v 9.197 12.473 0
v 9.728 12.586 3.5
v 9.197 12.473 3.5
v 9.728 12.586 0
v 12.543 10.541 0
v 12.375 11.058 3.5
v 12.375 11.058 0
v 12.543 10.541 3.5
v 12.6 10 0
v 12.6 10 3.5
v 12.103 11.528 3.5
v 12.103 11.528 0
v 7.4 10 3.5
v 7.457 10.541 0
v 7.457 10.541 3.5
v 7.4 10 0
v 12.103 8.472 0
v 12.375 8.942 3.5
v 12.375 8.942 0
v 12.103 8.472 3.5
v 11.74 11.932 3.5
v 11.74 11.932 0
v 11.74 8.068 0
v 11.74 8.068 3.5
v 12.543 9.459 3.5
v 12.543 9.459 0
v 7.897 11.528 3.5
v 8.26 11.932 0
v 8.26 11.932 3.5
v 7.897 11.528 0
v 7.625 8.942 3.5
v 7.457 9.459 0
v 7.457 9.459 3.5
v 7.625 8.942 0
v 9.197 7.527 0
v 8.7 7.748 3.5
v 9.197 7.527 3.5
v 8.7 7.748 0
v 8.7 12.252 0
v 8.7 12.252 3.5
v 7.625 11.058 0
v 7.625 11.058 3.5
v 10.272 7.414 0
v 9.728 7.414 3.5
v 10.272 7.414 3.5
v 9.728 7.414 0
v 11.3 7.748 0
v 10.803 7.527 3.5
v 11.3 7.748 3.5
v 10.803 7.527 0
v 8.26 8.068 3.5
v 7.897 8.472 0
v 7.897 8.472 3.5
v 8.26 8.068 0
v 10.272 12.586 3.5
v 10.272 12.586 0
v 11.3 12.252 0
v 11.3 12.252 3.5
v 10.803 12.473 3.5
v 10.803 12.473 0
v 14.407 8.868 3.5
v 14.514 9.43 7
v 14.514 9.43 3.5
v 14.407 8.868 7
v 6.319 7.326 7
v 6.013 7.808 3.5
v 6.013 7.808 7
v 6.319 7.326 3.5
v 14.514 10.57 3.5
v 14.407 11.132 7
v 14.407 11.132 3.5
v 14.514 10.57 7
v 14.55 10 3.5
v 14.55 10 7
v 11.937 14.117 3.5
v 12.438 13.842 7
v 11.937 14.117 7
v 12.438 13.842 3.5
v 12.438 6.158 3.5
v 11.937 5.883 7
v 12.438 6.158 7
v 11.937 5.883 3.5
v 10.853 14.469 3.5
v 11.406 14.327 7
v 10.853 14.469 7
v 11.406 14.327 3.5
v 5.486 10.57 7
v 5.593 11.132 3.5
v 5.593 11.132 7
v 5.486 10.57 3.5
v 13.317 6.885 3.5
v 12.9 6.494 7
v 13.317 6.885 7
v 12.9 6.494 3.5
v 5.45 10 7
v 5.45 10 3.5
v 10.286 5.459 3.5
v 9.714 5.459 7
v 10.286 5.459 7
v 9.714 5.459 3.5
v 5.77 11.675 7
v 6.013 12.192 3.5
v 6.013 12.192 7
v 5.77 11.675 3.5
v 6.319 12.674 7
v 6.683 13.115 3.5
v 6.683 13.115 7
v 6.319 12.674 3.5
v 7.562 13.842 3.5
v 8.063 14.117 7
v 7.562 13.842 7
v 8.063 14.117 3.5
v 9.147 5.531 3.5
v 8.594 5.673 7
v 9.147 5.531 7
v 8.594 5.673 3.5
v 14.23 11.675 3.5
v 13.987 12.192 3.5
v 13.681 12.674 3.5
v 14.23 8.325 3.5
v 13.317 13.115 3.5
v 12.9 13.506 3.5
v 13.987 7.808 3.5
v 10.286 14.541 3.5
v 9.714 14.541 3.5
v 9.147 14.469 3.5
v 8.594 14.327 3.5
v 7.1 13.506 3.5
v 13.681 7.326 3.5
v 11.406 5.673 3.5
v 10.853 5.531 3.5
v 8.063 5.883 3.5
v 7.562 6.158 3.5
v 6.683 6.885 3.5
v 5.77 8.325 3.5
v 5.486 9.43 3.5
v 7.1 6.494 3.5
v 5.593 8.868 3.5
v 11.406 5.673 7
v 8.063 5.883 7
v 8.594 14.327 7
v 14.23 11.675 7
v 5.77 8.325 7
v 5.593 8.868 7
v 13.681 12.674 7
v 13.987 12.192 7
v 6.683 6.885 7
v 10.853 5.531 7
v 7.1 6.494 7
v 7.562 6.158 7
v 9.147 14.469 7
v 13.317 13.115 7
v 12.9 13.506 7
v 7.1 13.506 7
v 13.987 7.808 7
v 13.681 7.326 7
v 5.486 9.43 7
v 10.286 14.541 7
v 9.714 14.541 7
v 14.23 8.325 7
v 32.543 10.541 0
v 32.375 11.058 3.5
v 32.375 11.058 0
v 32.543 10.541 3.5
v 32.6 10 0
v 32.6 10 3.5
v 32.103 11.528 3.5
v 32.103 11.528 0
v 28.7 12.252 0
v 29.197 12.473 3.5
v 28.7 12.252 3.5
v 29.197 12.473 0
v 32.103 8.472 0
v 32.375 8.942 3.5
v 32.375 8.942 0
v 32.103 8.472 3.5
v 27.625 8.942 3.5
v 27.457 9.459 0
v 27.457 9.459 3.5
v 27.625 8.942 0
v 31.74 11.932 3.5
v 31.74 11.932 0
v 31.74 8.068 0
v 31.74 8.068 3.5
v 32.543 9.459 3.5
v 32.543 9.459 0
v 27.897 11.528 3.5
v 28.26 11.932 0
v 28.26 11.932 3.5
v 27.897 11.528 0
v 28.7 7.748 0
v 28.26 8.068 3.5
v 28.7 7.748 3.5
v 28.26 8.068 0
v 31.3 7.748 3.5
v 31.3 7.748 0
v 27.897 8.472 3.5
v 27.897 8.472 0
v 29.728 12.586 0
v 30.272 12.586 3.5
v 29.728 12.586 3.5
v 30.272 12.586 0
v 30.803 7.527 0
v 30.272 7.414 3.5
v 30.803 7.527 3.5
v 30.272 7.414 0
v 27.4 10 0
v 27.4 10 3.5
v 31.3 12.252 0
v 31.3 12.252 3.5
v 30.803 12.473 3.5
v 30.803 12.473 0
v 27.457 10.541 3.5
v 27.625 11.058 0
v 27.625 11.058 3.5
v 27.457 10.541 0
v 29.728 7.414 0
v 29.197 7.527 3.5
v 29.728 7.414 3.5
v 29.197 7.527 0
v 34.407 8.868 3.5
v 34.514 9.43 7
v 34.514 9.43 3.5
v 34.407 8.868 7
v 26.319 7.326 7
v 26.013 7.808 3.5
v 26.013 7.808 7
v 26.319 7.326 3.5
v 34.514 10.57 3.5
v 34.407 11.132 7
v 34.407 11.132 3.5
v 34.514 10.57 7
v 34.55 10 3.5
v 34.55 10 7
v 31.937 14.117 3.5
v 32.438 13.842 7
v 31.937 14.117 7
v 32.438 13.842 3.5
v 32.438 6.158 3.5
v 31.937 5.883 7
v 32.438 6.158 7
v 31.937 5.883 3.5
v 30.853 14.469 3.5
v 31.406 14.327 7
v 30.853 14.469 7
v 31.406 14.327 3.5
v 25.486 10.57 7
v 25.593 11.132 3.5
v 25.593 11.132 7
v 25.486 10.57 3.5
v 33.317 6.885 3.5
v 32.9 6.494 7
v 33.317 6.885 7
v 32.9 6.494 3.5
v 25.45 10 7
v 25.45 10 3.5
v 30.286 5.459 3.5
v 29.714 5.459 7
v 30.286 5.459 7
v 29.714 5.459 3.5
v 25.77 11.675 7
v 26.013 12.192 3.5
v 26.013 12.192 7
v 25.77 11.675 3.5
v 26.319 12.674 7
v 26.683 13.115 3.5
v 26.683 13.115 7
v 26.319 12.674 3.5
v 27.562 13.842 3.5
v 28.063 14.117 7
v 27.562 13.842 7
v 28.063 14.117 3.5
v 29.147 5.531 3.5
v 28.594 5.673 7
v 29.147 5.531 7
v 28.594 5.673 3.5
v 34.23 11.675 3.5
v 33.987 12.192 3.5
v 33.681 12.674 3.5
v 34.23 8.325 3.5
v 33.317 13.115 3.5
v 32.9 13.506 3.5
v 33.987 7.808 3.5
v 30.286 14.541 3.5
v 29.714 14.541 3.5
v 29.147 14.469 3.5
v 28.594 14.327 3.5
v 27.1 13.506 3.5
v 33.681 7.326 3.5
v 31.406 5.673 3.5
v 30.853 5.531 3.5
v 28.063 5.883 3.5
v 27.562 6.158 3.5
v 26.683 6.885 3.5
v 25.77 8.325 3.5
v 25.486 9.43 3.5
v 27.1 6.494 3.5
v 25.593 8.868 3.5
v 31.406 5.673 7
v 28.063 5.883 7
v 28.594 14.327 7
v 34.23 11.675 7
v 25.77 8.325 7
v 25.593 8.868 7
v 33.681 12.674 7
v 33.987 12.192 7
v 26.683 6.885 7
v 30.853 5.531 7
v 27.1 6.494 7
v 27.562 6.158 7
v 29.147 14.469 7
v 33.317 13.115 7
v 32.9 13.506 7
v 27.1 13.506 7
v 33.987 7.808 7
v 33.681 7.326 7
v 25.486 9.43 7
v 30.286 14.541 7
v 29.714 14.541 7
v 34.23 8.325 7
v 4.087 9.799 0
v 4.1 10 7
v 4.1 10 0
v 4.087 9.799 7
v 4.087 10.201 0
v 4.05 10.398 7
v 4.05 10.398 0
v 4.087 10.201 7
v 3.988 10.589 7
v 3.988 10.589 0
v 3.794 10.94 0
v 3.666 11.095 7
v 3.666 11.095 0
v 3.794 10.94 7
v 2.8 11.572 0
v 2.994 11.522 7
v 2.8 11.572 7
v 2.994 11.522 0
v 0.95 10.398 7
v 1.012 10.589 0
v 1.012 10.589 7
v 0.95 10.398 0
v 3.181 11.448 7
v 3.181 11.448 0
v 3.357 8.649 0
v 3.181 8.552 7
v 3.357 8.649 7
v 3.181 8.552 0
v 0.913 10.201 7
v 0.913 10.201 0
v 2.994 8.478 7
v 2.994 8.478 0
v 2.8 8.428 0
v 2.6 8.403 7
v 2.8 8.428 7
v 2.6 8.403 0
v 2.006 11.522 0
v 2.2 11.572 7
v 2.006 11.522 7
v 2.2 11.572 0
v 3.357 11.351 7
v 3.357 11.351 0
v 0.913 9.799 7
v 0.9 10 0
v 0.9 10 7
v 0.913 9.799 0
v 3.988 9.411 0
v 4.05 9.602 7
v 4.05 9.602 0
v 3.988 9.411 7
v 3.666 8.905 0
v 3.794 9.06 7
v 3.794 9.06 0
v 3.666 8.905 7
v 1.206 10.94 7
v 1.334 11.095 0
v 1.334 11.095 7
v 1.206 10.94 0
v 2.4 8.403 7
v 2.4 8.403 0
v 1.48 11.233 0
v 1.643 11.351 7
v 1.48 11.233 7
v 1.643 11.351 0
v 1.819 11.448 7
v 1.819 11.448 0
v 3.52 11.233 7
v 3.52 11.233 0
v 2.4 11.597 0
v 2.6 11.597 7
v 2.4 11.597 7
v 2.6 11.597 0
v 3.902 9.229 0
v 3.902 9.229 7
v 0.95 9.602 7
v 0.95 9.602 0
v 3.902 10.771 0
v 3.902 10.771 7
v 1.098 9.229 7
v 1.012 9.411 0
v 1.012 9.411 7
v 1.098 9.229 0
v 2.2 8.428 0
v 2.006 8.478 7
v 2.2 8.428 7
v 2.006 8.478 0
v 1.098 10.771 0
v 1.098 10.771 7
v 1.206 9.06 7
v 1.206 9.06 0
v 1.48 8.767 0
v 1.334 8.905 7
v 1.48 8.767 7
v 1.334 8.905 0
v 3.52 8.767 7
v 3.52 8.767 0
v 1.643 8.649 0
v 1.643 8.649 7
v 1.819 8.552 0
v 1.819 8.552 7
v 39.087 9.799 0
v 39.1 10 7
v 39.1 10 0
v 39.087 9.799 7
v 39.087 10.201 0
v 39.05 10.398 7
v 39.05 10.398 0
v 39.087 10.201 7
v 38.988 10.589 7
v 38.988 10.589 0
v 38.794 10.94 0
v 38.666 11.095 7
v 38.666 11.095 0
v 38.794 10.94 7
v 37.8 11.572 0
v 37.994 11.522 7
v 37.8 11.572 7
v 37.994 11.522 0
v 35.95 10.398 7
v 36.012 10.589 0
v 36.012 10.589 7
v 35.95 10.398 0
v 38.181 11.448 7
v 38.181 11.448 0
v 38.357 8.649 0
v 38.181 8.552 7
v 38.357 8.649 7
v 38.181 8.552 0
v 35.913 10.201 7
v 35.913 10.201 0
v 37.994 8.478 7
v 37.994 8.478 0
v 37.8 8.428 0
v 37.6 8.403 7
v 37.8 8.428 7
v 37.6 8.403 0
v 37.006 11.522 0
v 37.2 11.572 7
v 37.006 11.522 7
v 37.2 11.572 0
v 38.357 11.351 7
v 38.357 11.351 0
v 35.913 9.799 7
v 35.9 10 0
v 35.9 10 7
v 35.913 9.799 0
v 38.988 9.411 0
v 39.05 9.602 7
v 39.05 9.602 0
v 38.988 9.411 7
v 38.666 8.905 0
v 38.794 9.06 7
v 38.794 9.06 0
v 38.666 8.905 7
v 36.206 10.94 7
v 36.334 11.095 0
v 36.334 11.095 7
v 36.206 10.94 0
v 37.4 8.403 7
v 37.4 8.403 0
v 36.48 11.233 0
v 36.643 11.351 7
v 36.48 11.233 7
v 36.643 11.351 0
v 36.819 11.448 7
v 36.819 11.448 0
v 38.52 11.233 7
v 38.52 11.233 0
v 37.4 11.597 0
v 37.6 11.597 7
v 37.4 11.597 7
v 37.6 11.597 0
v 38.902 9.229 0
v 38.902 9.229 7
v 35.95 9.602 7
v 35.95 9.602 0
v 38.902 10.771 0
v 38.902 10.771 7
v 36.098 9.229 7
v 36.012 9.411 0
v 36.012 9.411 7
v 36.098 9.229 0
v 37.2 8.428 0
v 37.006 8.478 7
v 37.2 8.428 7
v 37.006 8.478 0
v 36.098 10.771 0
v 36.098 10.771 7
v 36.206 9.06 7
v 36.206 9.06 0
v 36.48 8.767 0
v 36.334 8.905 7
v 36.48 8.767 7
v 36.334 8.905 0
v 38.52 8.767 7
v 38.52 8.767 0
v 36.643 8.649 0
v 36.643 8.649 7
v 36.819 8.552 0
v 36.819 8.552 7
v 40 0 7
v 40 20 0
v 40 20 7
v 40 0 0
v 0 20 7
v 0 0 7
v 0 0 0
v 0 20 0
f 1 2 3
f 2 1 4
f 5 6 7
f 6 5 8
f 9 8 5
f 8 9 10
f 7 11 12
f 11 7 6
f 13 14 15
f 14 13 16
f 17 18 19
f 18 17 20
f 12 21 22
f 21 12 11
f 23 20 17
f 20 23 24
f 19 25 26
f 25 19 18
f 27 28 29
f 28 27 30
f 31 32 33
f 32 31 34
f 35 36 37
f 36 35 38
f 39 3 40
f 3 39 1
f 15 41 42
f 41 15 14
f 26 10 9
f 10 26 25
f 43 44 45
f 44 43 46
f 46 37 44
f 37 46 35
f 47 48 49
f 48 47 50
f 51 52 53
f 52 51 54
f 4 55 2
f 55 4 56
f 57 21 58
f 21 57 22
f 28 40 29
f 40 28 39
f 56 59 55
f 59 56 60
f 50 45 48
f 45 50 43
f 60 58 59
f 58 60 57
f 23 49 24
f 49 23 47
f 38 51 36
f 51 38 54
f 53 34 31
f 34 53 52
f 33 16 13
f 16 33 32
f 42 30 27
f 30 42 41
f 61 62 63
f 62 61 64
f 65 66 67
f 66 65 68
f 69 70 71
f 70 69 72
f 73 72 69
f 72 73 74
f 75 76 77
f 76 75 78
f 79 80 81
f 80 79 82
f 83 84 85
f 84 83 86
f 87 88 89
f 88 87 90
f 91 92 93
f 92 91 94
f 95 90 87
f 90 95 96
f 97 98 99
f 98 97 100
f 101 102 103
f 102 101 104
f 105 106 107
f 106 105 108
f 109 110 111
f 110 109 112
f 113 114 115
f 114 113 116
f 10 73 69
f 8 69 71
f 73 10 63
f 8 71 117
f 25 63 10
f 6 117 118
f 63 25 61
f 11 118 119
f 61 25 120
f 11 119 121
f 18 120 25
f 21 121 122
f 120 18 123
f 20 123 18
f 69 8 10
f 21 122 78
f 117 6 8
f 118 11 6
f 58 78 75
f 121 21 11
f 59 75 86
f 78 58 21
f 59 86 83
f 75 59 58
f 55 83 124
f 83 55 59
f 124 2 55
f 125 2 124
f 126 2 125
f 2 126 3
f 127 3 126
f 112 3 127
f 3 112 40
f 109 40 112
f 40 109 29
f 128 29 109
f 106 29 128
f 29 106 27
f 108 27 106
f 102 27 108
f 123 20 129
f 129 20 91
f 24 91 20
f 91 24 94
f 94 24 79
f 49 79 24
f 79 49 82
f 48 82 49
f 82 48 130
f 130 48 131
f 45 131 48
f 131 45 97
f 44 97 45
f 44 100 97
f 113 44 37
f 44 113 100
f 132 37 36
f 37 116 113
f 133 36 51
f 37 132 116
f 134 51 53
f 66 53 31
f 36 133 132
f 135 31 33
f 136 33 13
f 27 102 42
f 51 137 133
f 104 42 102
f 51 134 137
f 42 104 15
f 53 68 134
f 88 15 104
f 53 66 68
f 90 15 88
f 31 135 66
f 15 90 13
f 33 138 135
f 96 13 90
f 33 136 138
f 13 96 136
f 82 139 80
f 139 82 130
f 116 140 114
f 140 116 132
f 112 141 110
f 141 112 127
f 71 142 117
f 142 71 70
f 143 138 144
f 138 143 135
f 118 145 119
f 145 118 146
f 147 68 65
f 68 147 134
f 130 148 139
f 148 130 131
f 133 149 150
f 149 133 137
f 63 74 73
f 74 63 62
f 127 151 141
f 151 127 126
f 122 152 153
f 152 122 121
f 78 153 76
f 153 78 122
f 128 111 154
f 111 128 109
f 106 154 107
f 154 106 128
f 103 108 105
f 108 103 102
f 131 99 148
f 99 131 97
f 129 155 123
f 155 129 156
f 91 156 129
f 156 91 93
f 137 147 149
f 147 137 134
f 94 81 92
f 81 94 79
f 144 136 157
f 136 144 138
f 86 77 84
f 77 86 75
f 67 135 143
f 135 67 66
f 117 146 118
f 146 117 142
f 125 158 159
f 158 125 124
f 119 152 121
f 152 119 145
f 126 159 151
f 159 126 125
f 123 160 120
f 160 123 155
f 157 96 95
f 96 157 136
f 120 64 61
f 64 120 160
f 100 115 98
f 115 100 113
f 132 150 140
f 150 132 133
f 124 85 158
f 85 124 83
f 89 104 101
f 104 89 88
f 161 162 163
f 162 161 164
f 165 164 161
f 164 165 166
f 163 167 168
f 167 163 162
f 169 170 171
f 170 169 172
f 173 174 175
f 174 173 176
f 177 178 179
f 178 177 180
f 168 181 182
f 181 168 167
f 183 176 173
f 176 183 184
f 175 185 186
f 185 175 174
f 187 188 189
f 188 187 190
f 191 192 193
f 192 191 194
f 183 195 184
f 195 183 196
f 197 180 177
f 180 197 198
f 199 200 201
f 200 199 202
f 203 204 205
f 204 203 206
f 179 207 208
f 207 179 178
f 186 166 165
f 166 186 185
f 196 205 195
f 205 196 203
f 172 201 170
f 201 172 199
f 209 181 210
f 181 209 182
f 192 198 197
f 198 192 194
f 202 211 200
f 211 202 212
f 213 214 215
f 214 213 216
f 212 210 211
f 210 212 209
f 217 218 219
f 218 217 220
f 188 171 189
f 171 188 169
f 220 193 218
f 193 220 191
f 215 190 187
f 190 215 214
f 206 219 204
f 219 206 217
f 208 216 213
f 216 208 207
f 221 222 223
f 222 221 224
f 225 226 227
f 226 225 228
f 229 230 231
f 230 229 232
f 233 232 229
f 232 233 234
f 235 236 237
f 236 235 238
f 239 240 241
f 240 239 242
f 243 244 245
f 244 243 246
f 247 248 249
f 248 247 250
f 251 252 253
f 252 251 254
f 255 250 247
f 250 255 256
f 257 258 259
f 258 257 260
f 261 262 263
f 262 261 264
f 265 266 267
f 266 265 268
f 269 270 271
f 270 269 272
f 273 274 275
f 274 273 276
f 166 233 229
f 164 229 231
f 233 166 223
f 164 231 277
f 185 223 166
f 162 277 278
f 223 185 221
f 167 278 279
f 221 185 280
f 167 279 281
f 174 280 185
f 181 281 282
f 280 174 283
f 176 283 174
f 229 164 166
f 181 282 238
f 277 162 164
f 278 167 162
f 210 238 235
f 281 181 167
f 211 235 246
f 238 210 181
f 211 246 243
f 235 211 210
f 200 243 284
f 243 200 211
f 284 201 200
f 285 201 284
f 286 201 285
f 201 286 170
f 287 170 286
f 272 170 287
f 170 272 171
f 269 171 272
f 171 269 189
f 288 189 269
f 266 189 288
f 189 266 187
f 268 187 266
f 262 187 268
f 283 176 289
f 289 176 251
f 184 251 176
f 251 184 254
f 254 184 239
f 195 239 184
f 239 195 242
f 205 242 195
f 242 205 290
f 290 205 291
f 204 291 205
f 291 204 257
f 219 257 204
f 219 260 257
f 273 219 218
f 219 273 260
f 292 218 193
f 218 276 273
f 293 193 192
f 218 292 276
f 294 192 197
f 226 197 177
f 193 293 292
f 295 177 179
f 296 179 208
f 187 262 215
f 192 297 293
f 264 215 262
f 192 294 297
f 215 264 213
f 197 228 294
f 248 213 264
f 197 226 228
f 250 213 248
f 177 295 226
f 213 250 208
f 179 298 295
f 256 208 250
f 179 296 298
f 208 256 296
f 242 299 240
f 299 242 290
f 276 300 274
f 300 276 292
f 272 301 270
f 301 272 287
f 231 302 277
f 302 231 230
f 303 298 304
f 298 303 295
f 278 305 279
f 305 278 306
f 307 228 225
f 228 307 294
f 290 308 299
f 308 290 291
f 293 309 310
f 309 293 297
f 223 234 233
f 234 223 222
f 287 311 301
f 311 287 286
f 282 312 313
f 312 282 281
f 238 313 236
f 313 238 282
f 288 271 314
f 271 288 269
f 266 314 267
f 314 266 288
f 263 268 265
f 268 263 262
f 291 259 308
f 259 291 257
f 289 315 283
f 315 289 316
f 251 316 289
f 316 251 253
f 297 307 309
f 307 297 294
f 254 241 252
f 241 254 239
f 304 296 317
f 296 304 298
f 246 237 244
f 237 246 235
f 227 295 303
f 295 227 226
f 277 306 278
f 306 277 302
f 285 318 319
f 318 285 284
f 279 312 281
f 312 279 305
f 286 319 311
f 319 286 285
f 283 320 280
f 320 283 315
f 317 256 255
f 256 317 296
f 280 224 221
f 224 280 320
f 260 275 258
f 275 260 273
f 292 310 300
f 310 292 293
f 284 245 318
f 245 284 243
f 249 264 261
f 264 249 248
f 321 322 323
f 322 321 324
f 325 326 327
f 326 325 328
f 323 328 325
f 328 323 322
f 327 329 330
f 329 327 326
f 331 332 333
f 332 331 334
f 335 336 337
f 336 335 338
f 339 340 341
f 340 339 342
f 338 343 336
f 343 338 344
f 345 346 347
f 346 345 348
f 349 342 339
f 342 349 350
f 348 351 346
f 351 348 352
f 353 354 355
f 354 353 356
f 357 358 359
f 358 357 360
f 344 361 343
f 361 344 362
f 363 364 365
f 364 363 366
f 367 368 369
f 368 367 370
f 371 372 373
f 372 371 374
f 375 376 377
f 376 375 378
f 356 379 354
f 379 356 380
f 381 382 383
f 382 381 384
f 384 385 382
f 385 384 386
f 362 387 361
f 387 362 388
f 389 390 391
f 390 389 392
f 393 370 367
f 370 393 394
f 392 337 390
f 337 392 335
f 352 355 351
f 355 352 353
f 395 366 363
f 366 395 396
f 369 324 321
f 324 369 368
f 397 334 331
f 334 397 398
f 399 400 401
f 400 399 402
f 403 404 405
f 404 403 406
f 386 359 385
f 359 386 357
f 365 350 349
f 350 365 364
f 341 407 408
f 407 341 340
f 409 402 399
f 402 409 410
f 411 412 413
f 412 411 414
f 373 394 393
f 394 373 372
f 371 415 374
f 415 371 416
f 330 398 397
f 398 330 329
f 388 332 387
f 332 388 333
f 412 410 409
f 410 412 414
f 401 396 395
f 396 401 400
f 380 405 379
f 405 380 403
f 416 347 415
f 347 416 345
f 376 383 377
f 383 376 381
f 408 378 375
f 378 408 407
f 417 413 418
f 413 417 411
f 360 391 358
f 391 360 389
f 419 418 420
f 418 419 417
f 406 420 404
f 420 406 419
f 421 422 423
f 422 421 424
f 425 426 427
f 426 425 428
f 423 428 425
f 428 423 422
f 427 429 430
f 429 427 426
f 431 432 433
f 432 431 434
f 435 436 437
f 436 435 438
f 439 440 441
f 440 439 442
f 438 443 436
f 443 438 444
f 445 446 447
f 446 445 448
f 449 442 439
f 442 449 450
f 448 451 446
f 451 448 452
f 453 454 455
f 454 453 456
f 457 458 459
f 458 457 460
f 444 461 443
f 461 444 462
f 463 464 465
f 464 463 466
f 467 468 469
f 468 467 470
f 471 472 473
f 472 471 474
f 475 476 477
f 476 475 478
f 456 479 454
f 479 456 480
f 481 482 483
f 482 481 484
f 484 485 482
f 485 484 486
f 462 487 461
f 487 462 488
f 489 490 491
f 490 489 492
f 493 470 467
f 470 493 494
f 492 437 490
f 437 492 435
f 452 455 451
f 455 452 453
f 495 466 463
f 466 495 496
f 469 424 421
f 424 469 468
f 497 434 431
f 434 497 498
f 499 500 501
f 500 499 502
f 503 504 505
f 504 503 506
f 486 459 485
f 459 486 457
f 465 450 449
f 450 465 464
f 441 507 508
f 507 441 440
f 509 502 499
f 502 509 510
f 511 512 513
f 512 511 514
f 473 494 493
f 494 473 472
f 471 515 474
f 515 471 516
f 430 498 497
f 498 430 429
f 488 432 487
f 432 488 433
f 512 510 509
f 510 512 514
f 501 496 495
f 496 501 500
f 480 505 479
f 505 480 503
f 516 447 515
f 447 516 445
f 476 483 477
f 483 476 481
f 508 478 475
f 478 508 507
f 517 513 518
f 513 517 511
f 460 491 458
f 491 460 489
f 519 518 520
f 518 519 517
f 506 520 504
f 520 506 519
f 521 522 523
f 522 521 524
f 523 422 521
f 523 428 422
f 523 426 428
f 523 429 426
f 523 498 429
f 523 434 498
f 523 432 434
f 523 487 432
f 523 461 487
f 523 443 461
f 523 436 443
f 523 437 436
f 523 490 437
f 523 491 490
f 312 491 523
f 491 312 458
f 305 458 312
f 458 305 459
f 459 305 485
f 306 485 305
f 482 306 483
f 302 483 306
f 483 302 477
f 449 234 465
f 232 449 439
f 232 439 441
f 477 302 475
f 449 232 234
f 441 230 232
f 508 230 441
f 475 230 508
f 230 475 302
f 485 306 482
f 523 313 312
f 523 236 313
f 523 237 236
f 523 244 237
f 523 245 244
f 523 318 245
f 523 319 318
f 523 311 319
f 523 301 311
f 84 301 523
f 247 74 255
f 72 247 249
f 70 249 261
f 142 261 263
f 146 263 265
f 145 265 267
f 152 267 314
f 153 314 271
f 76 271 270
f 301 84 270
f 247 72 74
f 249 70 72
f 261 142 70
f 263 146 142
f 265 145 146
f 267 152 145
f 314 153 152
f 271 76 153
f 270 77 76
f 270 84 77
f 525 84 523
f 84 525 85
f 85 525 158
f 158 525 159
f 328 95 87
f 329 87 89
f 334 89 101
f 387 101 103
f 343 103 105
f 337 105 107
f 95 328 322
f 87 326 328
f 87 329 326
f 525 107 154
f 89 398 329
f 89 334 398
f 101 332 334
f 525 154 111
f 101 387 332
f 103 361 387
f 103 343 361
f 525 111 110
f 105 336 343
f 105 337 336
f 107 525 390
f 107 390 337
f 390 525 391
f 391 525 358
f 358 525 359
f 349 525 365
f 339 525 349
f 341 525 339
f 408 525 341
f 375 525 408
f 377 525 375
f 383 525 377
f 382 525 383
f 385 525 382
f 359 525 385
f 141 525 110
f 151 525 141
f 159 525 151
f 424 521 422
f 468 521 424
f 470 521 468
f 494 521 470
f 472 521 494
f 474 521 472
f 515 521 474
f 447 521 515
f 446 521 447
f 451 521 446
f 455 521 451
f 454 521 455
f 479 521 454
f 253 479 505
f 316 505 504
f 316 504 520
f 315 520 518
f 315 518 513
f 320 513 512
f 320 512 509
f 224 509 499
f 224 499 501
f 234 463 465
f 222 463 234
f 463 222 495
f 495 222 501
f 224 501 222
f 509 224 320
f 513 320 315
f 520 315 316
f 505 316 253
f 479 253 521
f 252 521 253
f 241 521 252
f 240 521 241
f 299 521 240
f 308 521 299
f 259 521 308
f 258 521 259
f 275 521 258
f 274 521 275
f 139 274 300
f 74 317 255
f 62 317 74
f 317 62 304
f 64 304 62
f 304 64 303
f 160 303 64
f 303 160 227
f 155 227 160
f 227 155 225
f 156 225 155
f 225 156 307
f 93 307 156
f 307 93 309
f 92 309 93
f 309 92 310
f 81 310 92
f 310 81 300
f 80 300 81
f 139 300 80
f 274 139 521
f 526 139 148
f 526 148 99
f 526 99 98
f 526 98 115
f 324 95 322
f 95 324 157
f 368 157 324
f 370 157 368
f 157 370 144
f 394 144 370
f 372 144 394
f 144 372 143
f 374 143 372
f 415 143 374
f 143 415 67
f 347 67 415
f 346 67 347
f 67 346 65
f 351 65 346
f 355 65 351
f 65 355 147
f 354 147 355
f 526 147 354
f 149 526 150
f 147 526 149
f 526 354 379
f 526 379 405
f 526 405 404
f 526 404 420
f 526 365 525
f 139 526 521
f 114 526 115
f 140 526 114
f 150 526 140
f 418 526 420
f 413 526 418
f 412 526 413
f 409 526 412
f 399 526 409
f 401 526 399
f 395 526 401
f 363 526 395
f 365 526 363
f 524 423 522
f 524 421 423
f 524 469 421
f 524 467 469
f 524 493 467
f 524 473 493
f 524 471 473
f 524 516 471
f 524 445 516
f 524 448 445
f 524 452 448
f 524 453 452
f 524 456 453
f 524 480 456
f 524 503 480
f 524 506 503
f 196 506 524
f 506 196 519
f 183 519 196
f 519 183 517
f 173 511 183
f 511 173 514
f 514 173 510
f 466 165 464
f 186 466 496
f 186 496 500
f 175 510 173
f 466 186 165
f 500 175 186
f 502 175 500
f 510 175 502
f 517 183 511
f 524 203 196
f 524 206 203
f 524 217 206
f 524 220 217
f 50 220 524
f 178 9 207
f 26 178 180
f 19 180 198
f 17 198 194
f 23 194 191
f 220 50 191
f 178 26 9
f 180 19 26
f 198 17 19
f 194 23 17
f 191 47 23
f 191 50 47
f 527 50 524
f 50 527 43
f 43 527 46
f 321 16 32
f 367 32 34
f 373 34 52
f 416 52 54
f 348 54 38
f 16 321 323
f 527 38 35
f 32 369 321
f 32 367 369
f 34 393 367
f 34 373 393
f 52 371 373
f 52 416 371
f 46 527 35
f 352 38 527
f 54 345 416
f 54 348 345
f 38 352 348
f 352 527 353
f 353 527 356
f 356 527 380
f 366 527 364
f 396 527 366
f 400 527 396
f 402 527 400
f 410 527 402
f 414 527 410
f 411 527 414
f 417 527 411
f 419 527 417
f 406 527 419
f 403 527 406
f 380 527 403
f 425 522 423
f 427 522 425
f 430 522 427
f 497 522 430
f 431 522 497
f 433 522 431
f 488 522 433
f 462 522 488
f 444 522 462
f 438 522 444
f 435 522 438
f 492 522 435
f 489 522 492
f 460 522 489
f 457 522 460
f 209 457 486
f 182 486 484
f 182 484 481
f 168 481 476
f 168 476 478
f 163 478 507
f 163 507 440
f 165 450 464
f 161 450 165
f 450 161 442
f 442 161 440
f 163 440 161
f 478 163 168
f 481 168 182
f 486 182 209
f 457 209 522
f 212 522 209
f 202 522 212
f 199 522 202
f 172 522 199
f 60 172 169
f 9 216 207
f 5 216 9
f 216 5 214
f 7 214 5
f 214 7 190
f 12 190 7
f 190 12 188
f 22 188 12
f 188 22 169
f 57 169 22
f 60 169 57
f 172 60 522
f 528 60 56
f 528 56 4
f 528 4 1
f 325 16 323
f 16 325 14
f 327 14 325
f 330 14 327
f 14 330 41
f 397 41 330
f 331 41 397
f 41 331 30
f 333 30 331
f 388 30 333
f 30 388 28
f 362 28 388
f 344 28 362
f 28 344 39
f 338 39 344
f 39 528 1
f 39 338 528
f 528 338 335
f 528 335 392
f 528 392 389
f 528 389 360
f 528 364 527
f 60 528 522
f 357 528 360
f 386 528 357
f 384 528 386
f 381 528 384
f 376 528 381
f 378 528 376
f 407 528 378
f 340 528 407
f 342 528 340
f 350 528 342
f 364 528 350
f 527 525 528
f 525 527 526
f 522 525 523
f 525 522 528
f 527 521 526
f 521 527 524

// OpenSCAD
fondop = 20;		// slot width
anchop = 2*fondop;	// slot lenght
altop = 20;			// preform height
pared = 6;			// wall thikness
//hbase = 10;			// altura de la base de fijación
//abase = 7;			// anchura de la base respecto del borde externo del hueco
NEMA14 = 34;		// ancho y alto del NEMA 14 de la huxley.
//lanclaje = 115;	// largo de la base de anclaje
//espesor = 7;


// rd = radius
// lg = length
module rounded_corner(rd=5, lg=30){

	difference(){
		cube([rd+0.1, rd+0.1, lg]);
		translate([0,0,-2])cylinder(h=lg+4, r=rd, $fn=15*rd);
	}
}


// The begining. The main piece.
module proforma(altura, ancho, fondo, pared=2.7){
	difference(){
		union(){
			hull(){
				translate([0,0,0])cylinder(h=altura, r=pared, $fn=90);
				translate([ancho,0,0])cylinder(h=altura, r=pared, $fn=90);
				translate([ancho,fondo,0])cylinder(h=altura, r=pared, $fn=90);
				translate([0,fondo,0])cylinder(h=altura, r=pared, $fn=90);
			}
		}
		// hollow for aluminun slot
		translate([-0.1,-0.1,-1])cube([ancho+0.2,fondo+0.2,altura+2]);
	}
}


// Where the vertical and horizontal slots are joined
module base(alto=48, pared=2.7, perfil=20,mtor=3){

	difference(){
		union(){
			proforma(altura=alto, ancho=anchop, fondo=fondop, pared=pared); 

			color("pink")translate([anchop+2.1,-perfil,0])
				cube([perfil+pared,3*perfil,12]);

			color("cyan")translate([anchop+2.1,-perfil,0])
				cube([pared,3*perfil,alto]);

			color("red")translate([anchop+0.1,-2.7,0])
				cube([pared,perfil+5.4,alto]);
		}
		// holes for fixing screws (vertical slots)
		translate([-1.5*pared,11,alto/2])rotate([0,90,0])
			cylinder(h=60,r=(mtor/2)+0.1,$fn=30);
		// rebaje para hacer las patas del asiento del perfil horizontal
		translate([anchop+(perfil/2)+pared+2,60,-1])rotate([90,0,0])hull(){
			cylinder(h=100,r=perfil/3, $fn=6);
			translate([0,perfil/3,0])
				cylinder(h=100,r=perfil/6, $fn=6);
		}
		// rebaje en la base de asiento del perfil
		translate([55,-7,-10])hull(){
			translate([0,0,0])cylinder(h=alto, r=pared, $fn=90);
			translate([20,0,0])cylinder(h=alto, r=pared, $fn=90);
			translate([20,36,0])cylinder(h=alto, r=pared, $fn=90);
			translate([0,36,0])cylinder(h=alto, r=pared, $fn=90);
		}
		// holes for fixing screws (horizontal slots)
		translate([anchop+(perfil/2)+pared+2,perfil+15,0])
			cylinder(h=30, r=(mtor/2)+0.1, $fn=60);
		translate([anchop+(perfil/2)+pared+2,-15,0])
			cylinder(h=30, r=(mtor/2)+0.1, $fn=60);
		// holes for screw heads
		translate([anchop+(perfil/2)+pared+2,perfil+15,-1])
			cylinder(h=10.5, r=3, $fn=60);
		translate([anchop+(perfil/2)+pared+2,-15,-1])
			cylinder(h=10.5, r=3, $fn=60);
		// some screws for horizontal slots (reinforcement)
		translate([anchop-1,-15,(perfil/2)+13])rotate([0,90,0])
			cylinder(h=5*pared, r=(mtor/2)+0.1, $fn=60);
		translate([anchop-1,perfil+15,(perfil/2)+13])rotate([0,90,0])
			cylinder(h=5*pared, r=(mtor/2)+0.1, $fn=60);
		// bisel lateral en la pared del perfil horizontal
		translate([anchop-2,-26,25])rotate([45,0,0])cube([10,50,50]);
		translate([anchop-2,13,60])rotate([-45,0,0])cube([10,50,50]);
		// tornillos fijadores de la caja de conexiones
		translate([11,-5,35])rotate([-90,0,0])
			cylinder(h=alto, r=1.6, $fn=90);
		translate([33,-5,35])rotate([-90,0,0])
			cylinder(h=alto, r=1.6, $fn=90);
	}
}


module upper_union(largo,ancho,espesor=7){

	difference(){
		cube([largo,ancho,espesor]);
		union(){
			translate([ancho/2,ancho/2,-2])cylinder(h=10,r=2.6,$fn=30);
			translate([ancho/2,ancho/2,3.5])cylinder(h=10,r=4.55,$fn=50);

			translate([3*ancho/2,ancho/2,-2])cylinder(h=10,r=2.6,$fn=30);
			translate([3*ancho/2,ancho/2,3.5])cylinder(h=10,r=4.55,$fn=50);

			translate([2.5,ancho/2,-2])cylinder(h=10,r=1.6,$fn=50);
			translate([largo-2.5,ancho/2,-2])cylinder(h=10,r=1.6,$fn=50);
		}
	}
}


module presilla_perfil(largo=10, hole=true){

	difference(){
		union(){
			cube([largo,8,4]);
			translate([0,1.5,4])cube([largo,5,1.7]);
		}
		if (hole){	
			translate([largo/2,4,-2])union(){
				cylinder(h=20,r=1.6,$fn=30);	// hueco para el tornillo...
				cylinder(h=5,r=3.2,$fn=6);		// ... y para la tuerca.
			}
		}
	}
}


module porta_final_carrera(dejes=25){

	difference(){
		// proforma
		union(){
			hull(){
			translate([0,0,0])cylinder(h=10, r=5, $fn=40);
			translate([-1,6,0])cube([5,3,10]);
			}
			hull(){
			translate([dejes,0,0])cylinder(h=10, r=5, $fn=40);
			translate([dejes-4,6,0])cube([5,3,10]);
			}
			translate([0,6,0])cube([dejes,3,10]);
		}
		// hueco para encajar en las barras lisas
		union(){
			translate([0,0,-5])cylinder(h=25, r=3, $fn=40);
			translate([dejes,0,-5])cylinder(h=25, r=3, $fn=40);
			translate([-10,-16.5,-2])cube([50,15,15]);
			//sitio para los tornillos de fijacion del final de carrera
			translate([(dejes-4)/3,0,5])rotate([-90,0,0]){
				translate([0,0,-5])cylinder(h=15, r=1.3, $fn=30);
				hull(){
					translate([7,0,-5])cylinder(h=15, r=1.3, $fn=30);
					translate([11,0,-5])cylinder(h=15, r=1.3, $fn=30);
				}
			}
		}
	}
}


module caja_ONOFF(alt=50,la=44,an=30,esp=1.5){

	difference(){
		proforma(altura=alt,ancho=la,fondo=an,pared=esp);
		
		
		//translate([-5,-8,-5])cube([60,10,60]);
		//translate([-5,-2,-5])cube([60,10,12]);
		
		#translate([-10,8,25])cube([30,13.5,18.5]);
		#translate([5,14.5,10])rotate([0,-90,0])
			cylinder(h=10, r=4.1, $fn=50);
	}
	difference(){
	union(){
		translate([esp,esp,0])cylinder(h=alt, r=4, $fn=90);
		translate([la-esp,esp,0])cylinder(h=alt, r=4, $fn=90);
		translate([la-esp,an-esp,0])cylinder(h=alt, r=4, $fn=90);
		translate([esp,an-esp,0])cylinder(h=alt, r=4, $fn=90);
	}
	translate([esp,esp,10])cylinder(h=alt, r=1.2, $fn=90);
	translate([la-esp,esp,10])cylinder(h=alt, r=1.2, $fn=90);
	translate([la-esp,an-esp,10])cylinder(h=alt, r=1.2, $fn=90);
	translate([esp,an-esp,10])cylinder(h=alt, r=1.2, $fn=90);
	}
}


module guardacable(longitud){

	color("red")cube([longitud,9,0.9]);
	translate([0,2,0])cube([longitud,5,2.1]);
}


module foot(perfil = 22){

	color("orange")difference(){
		
		cube([perfil+15,43,perfil+2.5]);
	
	
		translate([2.5,2.5,2.5])cube([perfil+0.2,45,perfil+5]);
		translate([perfil+5.5,2.5,2.5])cube([perfil+0.2,45,perfil+5]);
		// esquinas biseladas
		translate([-5,55,7])rotate([45,0,0])cube([45,45,45]);
		translate([2*perfil,-5,12])rotate([0,-50,0])cube([45,45,45]);	
		translate([2*perfil,1.2*perfil,-5])rotate([0,0,45])cube([45,45,45]);	
		// agujeros para los tornillos fijadores
		translate([(perfil/2)+2.5,43-(perfil+2.5)+15,-5])
			cylinder(h=10, r=1.6, $fn=50);
		translate([(perfil/2)+2.5,-5,(perfil/2)+2.5])rotate([-90,0,0])
			cylinder(h=10, r=1.6, $fn=50);
	}
	
	color("red")translate([perfil,(perfil/2)+2.5-2.4,2.5])
		cube([3,4.9,perfil]);
	difference(){
		color("red")translate([perfil+5,2.5,2.5])
			cube([(perfil+15)-(perfil+5),12,12]);
		// bisel en el apoyo de la pata
		translate([perfil+5,16,10])rotate([45,0,0])
			cube([(perfil+15)-(perfil+5),12,12]);
	}
	color("cyan")translate([perfil+5,16,0])rotate([45,0,0])
		cube([10,2,5]);
	color("cyan")translate([perfil+5,4,12])rotate([45,0,0])
		cube([10,2,5]);
}


module portamotor_y(espesor=7, perfil=22){

	portamotor(espesor);

	// perfil aluminio
	//translate([2,-26,0])color("grey")cube([22,22,10]);

	translate([-0.6,(-perfil/2)-4,espesor/2])rotate([0,90,0])
		difference(){
			hull(){
				translate([-espesor/2,0,0])cube([espesor,perfil/2,2.5]);
				cylinder(h=2.5, r=espesor/2, $fn=60);
			}
		translate([0,0,-2])cylinder(h=10, r=1.6, $fn=60);
	}
	translate([perfil-0.5+2.5,(-perfil/2)-4,espesor/2])rotate([0,90,0])
		difference(){
			hull(){
				translate([-espesor/2,0,0])cube([espesor,perfil/2,2.5]);
				cylinder(h=2.5, r=espesor/2, $fn=60);
			}
		translate([0,0,-2])cylinder(h=10, r=1.6, $fn=60);
	}
	color("cyan")translate([-0.46,-7.55,0])rotate([0,0,45])
		cube([3,5,espesor]);
	color("cyan")translate([perfil+2.35,-5.4,0])rotate([0,0,-45])
		cube([3,5,espesor]);

}


module y_bearing_idler(){

	union(){
		difference(){
			hull(){
				cylinder(h=14.5, r=5, $fn=90);
				translate([-5,0,0])cube([10,10,14.5]);
			}
			translate([0,0,-10])cylinder(h=30, r=1.5, $fn=90);
			translate([-10,-12,4])cube([20,20,6.5]);
		}
		difference(){
			union(){
				translate([0,0,9.25])cylinder(h=1.25, r1=2, r2=3.5, $fn=90);
				translate([0,0,4])cylinder(h=1.25, r1=3.5, r2=2, $fn=90);
			}
			translate([0,0,-10])cylinder(h=30, r=1.5, $fn=90);
		}
		translate([0,12,-8])rotate([90,0,0])difference(){
			hull(){
				cylinder(h=2.5, r=5, $fn=60);
				translate([0,30,0])cylinder(h=2.5, r=5, $fn=60);
			}
			translate([0,0,-5])cylinder(h=10, r=1.6, $fn=50);
			translate([0,30,-5])cylinder(h=10, r=1.6, $fn=50);
		}
	}
}


module y_smooth_rod_holder(perfil=22){

	difference(){
		union(){
				cylinder(h=perfil+2.5, r=5, $fn=90);
			translate([0,-5,0])
				cube([(perfil/2)+5.1,10,perfil+2.5]);
			translate([(perfil/2)+5.1,0,0])
				cylinder(h=perfil+2.5, r=5, $fn=90);
		}
		// varilla lisa M6
		translate([0,0,perfil-2.5])cylinder(h=7, r=3.2, $fn=90);
		translate([5,-10,2.5])cube([50,50,50]);
		translate([(perfil/2)+5.1,0,-2])cylinder(h=7, r=1.6, $fn=90);
	}
	//color("lightgrey")translate([5,-15,2.5])cube([11,30,22]);
}


module clip_superior(espesor=10){

	translate([1,-2,0])difference(){
		union(){
			difference(){
				union(){
					// proforma
					translate([8,-4,0])cube([NEMA14+1,0.72*NEMA14,espesor]);
					// espaciador
					translate([8,-10,0])cube([NEMA14+1,6,espesor]);
				}
				union(){
					// hueco para la barra lisa
					translate([34,13.9,-2])
						cylinder(h=espesor+5, r=3, $fn=50);
					translate([-8,0,0])union(){
						// tornillo fijador de la barra lisa
						translate([47,4,espesor/2])rotate([-90,0,0])
							cylinder(h=20, r=1.6, $fn=50);
						// hueco para la tuerca fijadora
						translate([44.25,7,-2])cube([5.5,3.2,espesor+5]);
					}
				}
			}
		}
			// hueco para el rodamiento centrador...
			translate([18.5,13.9,espesor-5])cylinder(h=6, r=5.58, $fn=60);
			// ... y la varilla roscada
			translate([18.5,13.9,-2])cylinder(h=espesor+5, r=2.55, $fn=60);
			// extremos redondeados
			translate([5.95,17.5,-2])difference(){
				cube([5,5,espesor+5]);
				translate([5,0,-2])cylinder(h=espesor+5, r=3, $fn=50);
			}
			translate([40,17.5,-2])difference(){
				cube([4,4,espesor+5]);
				translate([0,0,-2])cylinder(h=espesor+5, r=3, $fn=50);
			}
			translate([NEMA14,13.5,-2])cube([15,0.5,espesor+5]);
			// vano central
			translate([14,-3.5,-2])hull(){
				cylinder(h=espesor+5, r=3, $fn=50);
				translate([0,5,0])cylinder(h=espesor+5, r=3, $fn=50);
				translate([23,5,0])cylinder(h=espesor+5, r=3, $fn=50);
				translate([23,0,0])cylinder(h=espesor+5, r=3, $fn=50);
			}
	}
}


module z_rod_holder(al=10, la=anchop, an=fondop){

	difference(){
		proforma(altura=al, ancho=la, fondo=an);

		translate([60,fondop/2,5])rotate([0,-90,0])
			cylinder(h=70, r=1.6, $fn=30);
	}
	translate([0,fondop+pared+8,0])clip_superior(espesor=7);
	// Upper cap
	translate([0,0,10])hull(){
		translate([0,0,0])cylinder(h=1.2, r=2.7, $fn=50);
		translate([la,0,0])cylinder(h=1.2, r=2.7, $fn=50);
		translate([la,an,0])cylinder(h=1.2, r=2.7, $fn=50);
		translate([0,an,0])cylinder(h=1.2, r=2.7, $fn=50);
	}
}


module portamotor(espesor=5){
	difference(){
		union(){
			difference(){
				// proforma
				translate([-4,-4,0])cube([NEMA14,NEMA14,espesor]);
		
				union(){
					// taladros para tornillos
					translate([0,0,-3])cylinder(h=espesor+5, r=1.6, $fn=30);
					translate([26,0,-3])cylinder(h=espesor+5, r=1.6, $fn=30);
					translate([0,26,-3])cylinder(h=espesor+5, r=1.6, $fn=30);
					translate([26,26,-3])cylinder(h=espesor+5, r=1.6, $fn=30);
					// muesca lateral
					translate([6,6,-3])cube([30,50,espesor+5]);
					//translate([6,-6,-5])cube([30,50,15]);
				}
			}
			// extremos redondeados
			translate([5.5,26.36,0])cylinder(h=espesor, r=3.65, $fn=50);
			translate([26.36,5.5,0])cylinder(h=espesor, r=3.65, $fn=50);
			//translate([5.9,-0.358,0])cylinder(h=espesor, r=3.65, $fn=50);
		}
			// hueco central

			translate([13,13,-2])cylinder(h=espesor+5, r=12, $fn=60);						%translate([13,13,-2])cylinder(h=espesor+5, r=2.6, $fn=50);
			%translate([-2.5,13,-2])cylinder(h=espesor+5, r=3.1, $fn=50);
			//%translate([13,-2.5,-2])cylinder(h=espesor+5, r=3.1, $fn=50);
	}
	// porta barra lisa
	//translate([-4,-17.1,0])cube([NEMA14,13.1,espesor]);
	//translate([13,13,-2])cylinder(h=10, r=2.5, $fn=60);
}


module z_motor_holder(esp=5){

	difference(){
		union(){
			translate([NEMA14-4,fondop+pared+6.9,0])rotate([0,0,90])
				portamotor(espesor=esp);
			// separacion del hueco del perfil
			translate([0,(fondop+pared/2)-2,0])
				cube([NEMA14+4,8,esp]);
			translate([NEMA14,(fondop+pared/2)-2,0])
				cube([4,NEMA14+7.9,esp]);
		}
		// hole for smooth rod
		translate([NEMA14-1.5,fondop+pared+19.9,-5])
			cylinder(h=70, r=3.1, $fn=30);
		translate([NEMA14-6,fondop+pared+19.5,-5])
			cube([5,0.5,30]);
		// external rounded corner
		translate([NEMA14+0.1,NEMA14+fondop+pared-1,-3])difference(){
			cube([5,5,esp+5]);
			translate([0,0,-3])cylinder(h=20,r=4,$fn=50);
		}
	}
	// agujero para los tornillos laterales de fijacion al perfil
	translate([-2.5,0,0])difference(){
		proforma(altura=10,ancho=anchop, fondo=fondop);
		translate([60,fondop/2,5])rotate([0,-90,0])
			cylinder(h=70, r=1.6, $fn=30);
	}
	// reinforcement (rounded internal corner)
	translate([0,fondop+pared+1.5,10])rotate([-90,0,-90])rounded_corner(lg=38);
}


module ONOFF_box(alt=50,la=54,an=30,esp=2.7){

	difference(){
		proforma(altura=alt,ancho=la,fondo=an,pared=esp);
		
		
		//translate([-5,-8,-5])cube([60,10,60]);
		//translate([-5,-2,-5])cube([60,10,12]);
		
		#translate([-10,8,25])cube([30,13.5,18.5]);
		#translate([5,14.5,10])rotate([0,-90,0])
			cylinder(h=10, r=4.1, $fn=50);
		#translate([55,-7,10])rotate([0,0,90])union(){
			// taladros fijadores
			hull(){
				translate([11,-15,35])rotate([-90,0,0])
					cylinder(h=30, r=1.6, $fn=50);
				translate([11,-15,40])rotate([-90,0,0])
					cylinder(h=30, r=1.6, $fn=50);
			}
			hull(){
				translate([33,-15,35])rotate([-90,0,0])
					cylinder(h=30, r=1.6, $fn=50);
				translate([33,-15,40])rotate([-90,0,0])
					cylinder(h=30, r=1.6, $fn=50);
			}
			// agujeros para la cabeza del tornillo fijador
			translate([11,-15,40])rotate([-90,0,0])
				cylinder(h=30, r=2.8, $fn=50);
			translate([33,-15,40])rotate([-90,0,0])
				cylinder(h=30, r=2.8, $fn=50);
		}
		#translate([55,-7,-30])rotate([0,0,90])union(){
			// taladros fijadores
			hull(){
				translate([11,-15,35])rotate([-90,0,0])
					cylinder(h=30, r=1.6, $fn=50);
				translate([11,-15,40])rotate([-90,0,0])
					cylinder(h=30, r=1.6, $fn=50);
			}
			hull(){
				translate([33,-15,35])rotate([-90,0,0])
					cylinder(h=30, r=1.6, $fn=50);
				translate([33,-15,40])rotate([-90,0,0])
					cylinder(h=30, r=1.6, $fn=50);
			}
			// agujeros para la cabeza del tornillo fijador
			translate([11,-15,40])rotate([-90,0,0])
				cylinder(h=30, r=2.8, $fn=50);
			translate([33,-15,40])rotate([-90,0,0])
				cylinder(h=30, r=2.8, $fn=50);
		}
		//#translate([la-5,an/2,0])rotate([0,90,0])
		//	cylinder(h=20, r=5, $fn=80);
		#union(){
			translate([(la/2)-10,an/2,5])rotate([90,0,0])
				cylinder(h=20, r=5, $fn=80);
			translate([(la/2)-15,-5,-1])
				cube([10,20,6]);
			translate([(la/2)+10,an/2,5])rotate([90,0,0])
				cylinder(h=20, r=5, $fn=80);
			translate([(la/2)+5,-5,-1])
				cube([10,20,6]);
		}
	}
	// agujeros para los tornillos de la tapa
	difference(){
		union(){
			translate([esp,esp,0])cylinder(h=alt, r=4, $fn=90);
			translate([la/2,esp,0])cylinder(h=alt, r=4, $fn=90);
			translate([la/2,an-esp,0])cylinder(h=alt, r=4, $fn=90);
			translate([esp,an-esp,0])cylinder(h=alt, r=4, $fn=90);
		}
		translate([esp,esp,10])cylinder(h=alt, r=1.2, $fn=90);
		translate([la/2,esp,10])cylinder(h=alt, r=1.2, $fn=90);
		translate([la/2,an-esp,10])cylinder(h=alt, r=1.2, $fn=90);
		translate([esp,an-esp,10])cylinder(h=alt, r=1.2, $fn=90);
		}
}


// ----------------------------------------------

//base();
//translate([0,10,0])z_motor_holder();
//mirror([0,1,0])z_motor_holder();
upper_union(largo=anchop,ancho=fondop);

//color("pink")ONOFF_box(esp=2);
//translate([10,0,0])z_rod_holder();
//mirror([1,0,0])z_rod_holder();
//presilla_perfil();

//porta_final_carrera(32);

//guardacable(longitud=30);



//color("pink")rotate([0,90,0])y_bearing_idler();
//foot();
//translate([-5,0,0])mirror([1,0,0])foot();
//translate([0,-5,0])mirror([0,1,0])foot();
//translate([-5,-5,0])mirror([1,0,0])mirror([0,1,0])foot();


//portamotor_y(espesor=10);

//y_smooth_rod_holder();
